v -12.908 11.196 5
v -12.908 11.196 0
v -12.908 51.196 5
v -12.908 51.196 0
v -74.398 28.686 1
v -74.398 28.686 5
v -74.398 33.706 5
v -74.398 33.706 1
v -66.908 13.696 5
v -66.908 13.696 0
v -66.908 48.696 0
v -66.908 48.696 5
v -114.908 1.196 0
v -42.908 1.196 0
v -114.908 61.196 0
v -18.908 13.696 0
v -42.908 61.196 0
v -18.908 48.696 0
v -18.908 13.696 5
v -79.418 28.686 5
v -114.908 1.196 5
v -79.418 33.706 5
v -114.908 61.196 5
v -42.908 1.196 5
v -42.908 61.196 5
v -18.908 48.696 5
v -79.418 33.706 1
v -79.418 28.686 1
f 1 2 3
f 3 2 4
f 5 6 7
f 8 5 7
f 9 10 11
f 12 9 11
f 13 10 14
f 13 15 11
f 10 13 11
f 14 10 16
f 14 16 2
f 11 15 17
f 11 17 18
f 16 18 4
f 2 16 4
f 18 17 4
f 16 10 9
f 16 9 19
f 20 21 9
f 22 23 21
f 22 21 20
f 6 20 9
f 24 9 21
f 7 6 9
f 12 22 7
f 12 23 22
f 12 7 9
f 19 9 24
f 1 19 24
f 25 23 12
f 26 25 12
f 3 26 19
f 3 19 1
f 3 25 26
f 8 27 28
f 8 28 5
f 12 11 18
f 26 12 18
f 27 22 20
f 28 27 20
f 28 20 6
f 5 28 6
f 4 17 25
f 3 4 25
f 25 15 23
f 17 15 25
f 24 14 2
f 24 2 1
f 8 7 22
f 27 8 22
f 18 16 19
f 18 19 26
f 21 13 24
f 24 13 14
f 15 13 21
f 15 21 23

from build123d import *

# Parameters (mm, degrees)
F0_W     = 102
F0_H     = 60
F0_W_2   = 48
F0_H_2   = 35
F1_DEPTH = 5
F3_DEPTH = 4
F4_SIZE2 = 30
F4_SIZE  = 10


with BuildPart() as f1:
    # F0 (on Top) → F1 (new body)
    with BuildSketch(Plane.XY):
        with Locations((-63.9077364467, 31.1956779382)):
            Rectangle(F0_W, F0_H)
        with Locations((-42.9077364467, 31.1956779382)):
            Rectangle(F0_W_2, F0_H_2, mode=Mode.SUBTRACT)
    extrude(amount=F1_DEPTH)

    # F2 (on face) → F3 (cut)
    with BuildSketch(Plane.XY.offset(5)):
        Polygon((-74.3977364467, 33.7056779382), (-79.4177364467, 33.7056779382), (-79.4177364467, 28.6856779382), (-74.3977364467, 28.6856779382), (-74.3977364467, 31.1956779382), align=None)
    extrude(amount=-F3_DEPTH, mode=Mode.SUBTRACT)

    # F4
    f4_edges = [f1.edges().sort_by_distance(p)[0] for p in [
        (-12.907736, 1.195678, 2.5),
        (-12.907736, 61.195678, 2.5),
    ]]
    f4_side = f1.faces().sort_by_distance((-12.907736, 31.195678, 2.5))[0]
    chamfer(f4_edges, length=F4_SIZE, length2=F4_SIZE2, reference=f4_side)


solid = f1.part
